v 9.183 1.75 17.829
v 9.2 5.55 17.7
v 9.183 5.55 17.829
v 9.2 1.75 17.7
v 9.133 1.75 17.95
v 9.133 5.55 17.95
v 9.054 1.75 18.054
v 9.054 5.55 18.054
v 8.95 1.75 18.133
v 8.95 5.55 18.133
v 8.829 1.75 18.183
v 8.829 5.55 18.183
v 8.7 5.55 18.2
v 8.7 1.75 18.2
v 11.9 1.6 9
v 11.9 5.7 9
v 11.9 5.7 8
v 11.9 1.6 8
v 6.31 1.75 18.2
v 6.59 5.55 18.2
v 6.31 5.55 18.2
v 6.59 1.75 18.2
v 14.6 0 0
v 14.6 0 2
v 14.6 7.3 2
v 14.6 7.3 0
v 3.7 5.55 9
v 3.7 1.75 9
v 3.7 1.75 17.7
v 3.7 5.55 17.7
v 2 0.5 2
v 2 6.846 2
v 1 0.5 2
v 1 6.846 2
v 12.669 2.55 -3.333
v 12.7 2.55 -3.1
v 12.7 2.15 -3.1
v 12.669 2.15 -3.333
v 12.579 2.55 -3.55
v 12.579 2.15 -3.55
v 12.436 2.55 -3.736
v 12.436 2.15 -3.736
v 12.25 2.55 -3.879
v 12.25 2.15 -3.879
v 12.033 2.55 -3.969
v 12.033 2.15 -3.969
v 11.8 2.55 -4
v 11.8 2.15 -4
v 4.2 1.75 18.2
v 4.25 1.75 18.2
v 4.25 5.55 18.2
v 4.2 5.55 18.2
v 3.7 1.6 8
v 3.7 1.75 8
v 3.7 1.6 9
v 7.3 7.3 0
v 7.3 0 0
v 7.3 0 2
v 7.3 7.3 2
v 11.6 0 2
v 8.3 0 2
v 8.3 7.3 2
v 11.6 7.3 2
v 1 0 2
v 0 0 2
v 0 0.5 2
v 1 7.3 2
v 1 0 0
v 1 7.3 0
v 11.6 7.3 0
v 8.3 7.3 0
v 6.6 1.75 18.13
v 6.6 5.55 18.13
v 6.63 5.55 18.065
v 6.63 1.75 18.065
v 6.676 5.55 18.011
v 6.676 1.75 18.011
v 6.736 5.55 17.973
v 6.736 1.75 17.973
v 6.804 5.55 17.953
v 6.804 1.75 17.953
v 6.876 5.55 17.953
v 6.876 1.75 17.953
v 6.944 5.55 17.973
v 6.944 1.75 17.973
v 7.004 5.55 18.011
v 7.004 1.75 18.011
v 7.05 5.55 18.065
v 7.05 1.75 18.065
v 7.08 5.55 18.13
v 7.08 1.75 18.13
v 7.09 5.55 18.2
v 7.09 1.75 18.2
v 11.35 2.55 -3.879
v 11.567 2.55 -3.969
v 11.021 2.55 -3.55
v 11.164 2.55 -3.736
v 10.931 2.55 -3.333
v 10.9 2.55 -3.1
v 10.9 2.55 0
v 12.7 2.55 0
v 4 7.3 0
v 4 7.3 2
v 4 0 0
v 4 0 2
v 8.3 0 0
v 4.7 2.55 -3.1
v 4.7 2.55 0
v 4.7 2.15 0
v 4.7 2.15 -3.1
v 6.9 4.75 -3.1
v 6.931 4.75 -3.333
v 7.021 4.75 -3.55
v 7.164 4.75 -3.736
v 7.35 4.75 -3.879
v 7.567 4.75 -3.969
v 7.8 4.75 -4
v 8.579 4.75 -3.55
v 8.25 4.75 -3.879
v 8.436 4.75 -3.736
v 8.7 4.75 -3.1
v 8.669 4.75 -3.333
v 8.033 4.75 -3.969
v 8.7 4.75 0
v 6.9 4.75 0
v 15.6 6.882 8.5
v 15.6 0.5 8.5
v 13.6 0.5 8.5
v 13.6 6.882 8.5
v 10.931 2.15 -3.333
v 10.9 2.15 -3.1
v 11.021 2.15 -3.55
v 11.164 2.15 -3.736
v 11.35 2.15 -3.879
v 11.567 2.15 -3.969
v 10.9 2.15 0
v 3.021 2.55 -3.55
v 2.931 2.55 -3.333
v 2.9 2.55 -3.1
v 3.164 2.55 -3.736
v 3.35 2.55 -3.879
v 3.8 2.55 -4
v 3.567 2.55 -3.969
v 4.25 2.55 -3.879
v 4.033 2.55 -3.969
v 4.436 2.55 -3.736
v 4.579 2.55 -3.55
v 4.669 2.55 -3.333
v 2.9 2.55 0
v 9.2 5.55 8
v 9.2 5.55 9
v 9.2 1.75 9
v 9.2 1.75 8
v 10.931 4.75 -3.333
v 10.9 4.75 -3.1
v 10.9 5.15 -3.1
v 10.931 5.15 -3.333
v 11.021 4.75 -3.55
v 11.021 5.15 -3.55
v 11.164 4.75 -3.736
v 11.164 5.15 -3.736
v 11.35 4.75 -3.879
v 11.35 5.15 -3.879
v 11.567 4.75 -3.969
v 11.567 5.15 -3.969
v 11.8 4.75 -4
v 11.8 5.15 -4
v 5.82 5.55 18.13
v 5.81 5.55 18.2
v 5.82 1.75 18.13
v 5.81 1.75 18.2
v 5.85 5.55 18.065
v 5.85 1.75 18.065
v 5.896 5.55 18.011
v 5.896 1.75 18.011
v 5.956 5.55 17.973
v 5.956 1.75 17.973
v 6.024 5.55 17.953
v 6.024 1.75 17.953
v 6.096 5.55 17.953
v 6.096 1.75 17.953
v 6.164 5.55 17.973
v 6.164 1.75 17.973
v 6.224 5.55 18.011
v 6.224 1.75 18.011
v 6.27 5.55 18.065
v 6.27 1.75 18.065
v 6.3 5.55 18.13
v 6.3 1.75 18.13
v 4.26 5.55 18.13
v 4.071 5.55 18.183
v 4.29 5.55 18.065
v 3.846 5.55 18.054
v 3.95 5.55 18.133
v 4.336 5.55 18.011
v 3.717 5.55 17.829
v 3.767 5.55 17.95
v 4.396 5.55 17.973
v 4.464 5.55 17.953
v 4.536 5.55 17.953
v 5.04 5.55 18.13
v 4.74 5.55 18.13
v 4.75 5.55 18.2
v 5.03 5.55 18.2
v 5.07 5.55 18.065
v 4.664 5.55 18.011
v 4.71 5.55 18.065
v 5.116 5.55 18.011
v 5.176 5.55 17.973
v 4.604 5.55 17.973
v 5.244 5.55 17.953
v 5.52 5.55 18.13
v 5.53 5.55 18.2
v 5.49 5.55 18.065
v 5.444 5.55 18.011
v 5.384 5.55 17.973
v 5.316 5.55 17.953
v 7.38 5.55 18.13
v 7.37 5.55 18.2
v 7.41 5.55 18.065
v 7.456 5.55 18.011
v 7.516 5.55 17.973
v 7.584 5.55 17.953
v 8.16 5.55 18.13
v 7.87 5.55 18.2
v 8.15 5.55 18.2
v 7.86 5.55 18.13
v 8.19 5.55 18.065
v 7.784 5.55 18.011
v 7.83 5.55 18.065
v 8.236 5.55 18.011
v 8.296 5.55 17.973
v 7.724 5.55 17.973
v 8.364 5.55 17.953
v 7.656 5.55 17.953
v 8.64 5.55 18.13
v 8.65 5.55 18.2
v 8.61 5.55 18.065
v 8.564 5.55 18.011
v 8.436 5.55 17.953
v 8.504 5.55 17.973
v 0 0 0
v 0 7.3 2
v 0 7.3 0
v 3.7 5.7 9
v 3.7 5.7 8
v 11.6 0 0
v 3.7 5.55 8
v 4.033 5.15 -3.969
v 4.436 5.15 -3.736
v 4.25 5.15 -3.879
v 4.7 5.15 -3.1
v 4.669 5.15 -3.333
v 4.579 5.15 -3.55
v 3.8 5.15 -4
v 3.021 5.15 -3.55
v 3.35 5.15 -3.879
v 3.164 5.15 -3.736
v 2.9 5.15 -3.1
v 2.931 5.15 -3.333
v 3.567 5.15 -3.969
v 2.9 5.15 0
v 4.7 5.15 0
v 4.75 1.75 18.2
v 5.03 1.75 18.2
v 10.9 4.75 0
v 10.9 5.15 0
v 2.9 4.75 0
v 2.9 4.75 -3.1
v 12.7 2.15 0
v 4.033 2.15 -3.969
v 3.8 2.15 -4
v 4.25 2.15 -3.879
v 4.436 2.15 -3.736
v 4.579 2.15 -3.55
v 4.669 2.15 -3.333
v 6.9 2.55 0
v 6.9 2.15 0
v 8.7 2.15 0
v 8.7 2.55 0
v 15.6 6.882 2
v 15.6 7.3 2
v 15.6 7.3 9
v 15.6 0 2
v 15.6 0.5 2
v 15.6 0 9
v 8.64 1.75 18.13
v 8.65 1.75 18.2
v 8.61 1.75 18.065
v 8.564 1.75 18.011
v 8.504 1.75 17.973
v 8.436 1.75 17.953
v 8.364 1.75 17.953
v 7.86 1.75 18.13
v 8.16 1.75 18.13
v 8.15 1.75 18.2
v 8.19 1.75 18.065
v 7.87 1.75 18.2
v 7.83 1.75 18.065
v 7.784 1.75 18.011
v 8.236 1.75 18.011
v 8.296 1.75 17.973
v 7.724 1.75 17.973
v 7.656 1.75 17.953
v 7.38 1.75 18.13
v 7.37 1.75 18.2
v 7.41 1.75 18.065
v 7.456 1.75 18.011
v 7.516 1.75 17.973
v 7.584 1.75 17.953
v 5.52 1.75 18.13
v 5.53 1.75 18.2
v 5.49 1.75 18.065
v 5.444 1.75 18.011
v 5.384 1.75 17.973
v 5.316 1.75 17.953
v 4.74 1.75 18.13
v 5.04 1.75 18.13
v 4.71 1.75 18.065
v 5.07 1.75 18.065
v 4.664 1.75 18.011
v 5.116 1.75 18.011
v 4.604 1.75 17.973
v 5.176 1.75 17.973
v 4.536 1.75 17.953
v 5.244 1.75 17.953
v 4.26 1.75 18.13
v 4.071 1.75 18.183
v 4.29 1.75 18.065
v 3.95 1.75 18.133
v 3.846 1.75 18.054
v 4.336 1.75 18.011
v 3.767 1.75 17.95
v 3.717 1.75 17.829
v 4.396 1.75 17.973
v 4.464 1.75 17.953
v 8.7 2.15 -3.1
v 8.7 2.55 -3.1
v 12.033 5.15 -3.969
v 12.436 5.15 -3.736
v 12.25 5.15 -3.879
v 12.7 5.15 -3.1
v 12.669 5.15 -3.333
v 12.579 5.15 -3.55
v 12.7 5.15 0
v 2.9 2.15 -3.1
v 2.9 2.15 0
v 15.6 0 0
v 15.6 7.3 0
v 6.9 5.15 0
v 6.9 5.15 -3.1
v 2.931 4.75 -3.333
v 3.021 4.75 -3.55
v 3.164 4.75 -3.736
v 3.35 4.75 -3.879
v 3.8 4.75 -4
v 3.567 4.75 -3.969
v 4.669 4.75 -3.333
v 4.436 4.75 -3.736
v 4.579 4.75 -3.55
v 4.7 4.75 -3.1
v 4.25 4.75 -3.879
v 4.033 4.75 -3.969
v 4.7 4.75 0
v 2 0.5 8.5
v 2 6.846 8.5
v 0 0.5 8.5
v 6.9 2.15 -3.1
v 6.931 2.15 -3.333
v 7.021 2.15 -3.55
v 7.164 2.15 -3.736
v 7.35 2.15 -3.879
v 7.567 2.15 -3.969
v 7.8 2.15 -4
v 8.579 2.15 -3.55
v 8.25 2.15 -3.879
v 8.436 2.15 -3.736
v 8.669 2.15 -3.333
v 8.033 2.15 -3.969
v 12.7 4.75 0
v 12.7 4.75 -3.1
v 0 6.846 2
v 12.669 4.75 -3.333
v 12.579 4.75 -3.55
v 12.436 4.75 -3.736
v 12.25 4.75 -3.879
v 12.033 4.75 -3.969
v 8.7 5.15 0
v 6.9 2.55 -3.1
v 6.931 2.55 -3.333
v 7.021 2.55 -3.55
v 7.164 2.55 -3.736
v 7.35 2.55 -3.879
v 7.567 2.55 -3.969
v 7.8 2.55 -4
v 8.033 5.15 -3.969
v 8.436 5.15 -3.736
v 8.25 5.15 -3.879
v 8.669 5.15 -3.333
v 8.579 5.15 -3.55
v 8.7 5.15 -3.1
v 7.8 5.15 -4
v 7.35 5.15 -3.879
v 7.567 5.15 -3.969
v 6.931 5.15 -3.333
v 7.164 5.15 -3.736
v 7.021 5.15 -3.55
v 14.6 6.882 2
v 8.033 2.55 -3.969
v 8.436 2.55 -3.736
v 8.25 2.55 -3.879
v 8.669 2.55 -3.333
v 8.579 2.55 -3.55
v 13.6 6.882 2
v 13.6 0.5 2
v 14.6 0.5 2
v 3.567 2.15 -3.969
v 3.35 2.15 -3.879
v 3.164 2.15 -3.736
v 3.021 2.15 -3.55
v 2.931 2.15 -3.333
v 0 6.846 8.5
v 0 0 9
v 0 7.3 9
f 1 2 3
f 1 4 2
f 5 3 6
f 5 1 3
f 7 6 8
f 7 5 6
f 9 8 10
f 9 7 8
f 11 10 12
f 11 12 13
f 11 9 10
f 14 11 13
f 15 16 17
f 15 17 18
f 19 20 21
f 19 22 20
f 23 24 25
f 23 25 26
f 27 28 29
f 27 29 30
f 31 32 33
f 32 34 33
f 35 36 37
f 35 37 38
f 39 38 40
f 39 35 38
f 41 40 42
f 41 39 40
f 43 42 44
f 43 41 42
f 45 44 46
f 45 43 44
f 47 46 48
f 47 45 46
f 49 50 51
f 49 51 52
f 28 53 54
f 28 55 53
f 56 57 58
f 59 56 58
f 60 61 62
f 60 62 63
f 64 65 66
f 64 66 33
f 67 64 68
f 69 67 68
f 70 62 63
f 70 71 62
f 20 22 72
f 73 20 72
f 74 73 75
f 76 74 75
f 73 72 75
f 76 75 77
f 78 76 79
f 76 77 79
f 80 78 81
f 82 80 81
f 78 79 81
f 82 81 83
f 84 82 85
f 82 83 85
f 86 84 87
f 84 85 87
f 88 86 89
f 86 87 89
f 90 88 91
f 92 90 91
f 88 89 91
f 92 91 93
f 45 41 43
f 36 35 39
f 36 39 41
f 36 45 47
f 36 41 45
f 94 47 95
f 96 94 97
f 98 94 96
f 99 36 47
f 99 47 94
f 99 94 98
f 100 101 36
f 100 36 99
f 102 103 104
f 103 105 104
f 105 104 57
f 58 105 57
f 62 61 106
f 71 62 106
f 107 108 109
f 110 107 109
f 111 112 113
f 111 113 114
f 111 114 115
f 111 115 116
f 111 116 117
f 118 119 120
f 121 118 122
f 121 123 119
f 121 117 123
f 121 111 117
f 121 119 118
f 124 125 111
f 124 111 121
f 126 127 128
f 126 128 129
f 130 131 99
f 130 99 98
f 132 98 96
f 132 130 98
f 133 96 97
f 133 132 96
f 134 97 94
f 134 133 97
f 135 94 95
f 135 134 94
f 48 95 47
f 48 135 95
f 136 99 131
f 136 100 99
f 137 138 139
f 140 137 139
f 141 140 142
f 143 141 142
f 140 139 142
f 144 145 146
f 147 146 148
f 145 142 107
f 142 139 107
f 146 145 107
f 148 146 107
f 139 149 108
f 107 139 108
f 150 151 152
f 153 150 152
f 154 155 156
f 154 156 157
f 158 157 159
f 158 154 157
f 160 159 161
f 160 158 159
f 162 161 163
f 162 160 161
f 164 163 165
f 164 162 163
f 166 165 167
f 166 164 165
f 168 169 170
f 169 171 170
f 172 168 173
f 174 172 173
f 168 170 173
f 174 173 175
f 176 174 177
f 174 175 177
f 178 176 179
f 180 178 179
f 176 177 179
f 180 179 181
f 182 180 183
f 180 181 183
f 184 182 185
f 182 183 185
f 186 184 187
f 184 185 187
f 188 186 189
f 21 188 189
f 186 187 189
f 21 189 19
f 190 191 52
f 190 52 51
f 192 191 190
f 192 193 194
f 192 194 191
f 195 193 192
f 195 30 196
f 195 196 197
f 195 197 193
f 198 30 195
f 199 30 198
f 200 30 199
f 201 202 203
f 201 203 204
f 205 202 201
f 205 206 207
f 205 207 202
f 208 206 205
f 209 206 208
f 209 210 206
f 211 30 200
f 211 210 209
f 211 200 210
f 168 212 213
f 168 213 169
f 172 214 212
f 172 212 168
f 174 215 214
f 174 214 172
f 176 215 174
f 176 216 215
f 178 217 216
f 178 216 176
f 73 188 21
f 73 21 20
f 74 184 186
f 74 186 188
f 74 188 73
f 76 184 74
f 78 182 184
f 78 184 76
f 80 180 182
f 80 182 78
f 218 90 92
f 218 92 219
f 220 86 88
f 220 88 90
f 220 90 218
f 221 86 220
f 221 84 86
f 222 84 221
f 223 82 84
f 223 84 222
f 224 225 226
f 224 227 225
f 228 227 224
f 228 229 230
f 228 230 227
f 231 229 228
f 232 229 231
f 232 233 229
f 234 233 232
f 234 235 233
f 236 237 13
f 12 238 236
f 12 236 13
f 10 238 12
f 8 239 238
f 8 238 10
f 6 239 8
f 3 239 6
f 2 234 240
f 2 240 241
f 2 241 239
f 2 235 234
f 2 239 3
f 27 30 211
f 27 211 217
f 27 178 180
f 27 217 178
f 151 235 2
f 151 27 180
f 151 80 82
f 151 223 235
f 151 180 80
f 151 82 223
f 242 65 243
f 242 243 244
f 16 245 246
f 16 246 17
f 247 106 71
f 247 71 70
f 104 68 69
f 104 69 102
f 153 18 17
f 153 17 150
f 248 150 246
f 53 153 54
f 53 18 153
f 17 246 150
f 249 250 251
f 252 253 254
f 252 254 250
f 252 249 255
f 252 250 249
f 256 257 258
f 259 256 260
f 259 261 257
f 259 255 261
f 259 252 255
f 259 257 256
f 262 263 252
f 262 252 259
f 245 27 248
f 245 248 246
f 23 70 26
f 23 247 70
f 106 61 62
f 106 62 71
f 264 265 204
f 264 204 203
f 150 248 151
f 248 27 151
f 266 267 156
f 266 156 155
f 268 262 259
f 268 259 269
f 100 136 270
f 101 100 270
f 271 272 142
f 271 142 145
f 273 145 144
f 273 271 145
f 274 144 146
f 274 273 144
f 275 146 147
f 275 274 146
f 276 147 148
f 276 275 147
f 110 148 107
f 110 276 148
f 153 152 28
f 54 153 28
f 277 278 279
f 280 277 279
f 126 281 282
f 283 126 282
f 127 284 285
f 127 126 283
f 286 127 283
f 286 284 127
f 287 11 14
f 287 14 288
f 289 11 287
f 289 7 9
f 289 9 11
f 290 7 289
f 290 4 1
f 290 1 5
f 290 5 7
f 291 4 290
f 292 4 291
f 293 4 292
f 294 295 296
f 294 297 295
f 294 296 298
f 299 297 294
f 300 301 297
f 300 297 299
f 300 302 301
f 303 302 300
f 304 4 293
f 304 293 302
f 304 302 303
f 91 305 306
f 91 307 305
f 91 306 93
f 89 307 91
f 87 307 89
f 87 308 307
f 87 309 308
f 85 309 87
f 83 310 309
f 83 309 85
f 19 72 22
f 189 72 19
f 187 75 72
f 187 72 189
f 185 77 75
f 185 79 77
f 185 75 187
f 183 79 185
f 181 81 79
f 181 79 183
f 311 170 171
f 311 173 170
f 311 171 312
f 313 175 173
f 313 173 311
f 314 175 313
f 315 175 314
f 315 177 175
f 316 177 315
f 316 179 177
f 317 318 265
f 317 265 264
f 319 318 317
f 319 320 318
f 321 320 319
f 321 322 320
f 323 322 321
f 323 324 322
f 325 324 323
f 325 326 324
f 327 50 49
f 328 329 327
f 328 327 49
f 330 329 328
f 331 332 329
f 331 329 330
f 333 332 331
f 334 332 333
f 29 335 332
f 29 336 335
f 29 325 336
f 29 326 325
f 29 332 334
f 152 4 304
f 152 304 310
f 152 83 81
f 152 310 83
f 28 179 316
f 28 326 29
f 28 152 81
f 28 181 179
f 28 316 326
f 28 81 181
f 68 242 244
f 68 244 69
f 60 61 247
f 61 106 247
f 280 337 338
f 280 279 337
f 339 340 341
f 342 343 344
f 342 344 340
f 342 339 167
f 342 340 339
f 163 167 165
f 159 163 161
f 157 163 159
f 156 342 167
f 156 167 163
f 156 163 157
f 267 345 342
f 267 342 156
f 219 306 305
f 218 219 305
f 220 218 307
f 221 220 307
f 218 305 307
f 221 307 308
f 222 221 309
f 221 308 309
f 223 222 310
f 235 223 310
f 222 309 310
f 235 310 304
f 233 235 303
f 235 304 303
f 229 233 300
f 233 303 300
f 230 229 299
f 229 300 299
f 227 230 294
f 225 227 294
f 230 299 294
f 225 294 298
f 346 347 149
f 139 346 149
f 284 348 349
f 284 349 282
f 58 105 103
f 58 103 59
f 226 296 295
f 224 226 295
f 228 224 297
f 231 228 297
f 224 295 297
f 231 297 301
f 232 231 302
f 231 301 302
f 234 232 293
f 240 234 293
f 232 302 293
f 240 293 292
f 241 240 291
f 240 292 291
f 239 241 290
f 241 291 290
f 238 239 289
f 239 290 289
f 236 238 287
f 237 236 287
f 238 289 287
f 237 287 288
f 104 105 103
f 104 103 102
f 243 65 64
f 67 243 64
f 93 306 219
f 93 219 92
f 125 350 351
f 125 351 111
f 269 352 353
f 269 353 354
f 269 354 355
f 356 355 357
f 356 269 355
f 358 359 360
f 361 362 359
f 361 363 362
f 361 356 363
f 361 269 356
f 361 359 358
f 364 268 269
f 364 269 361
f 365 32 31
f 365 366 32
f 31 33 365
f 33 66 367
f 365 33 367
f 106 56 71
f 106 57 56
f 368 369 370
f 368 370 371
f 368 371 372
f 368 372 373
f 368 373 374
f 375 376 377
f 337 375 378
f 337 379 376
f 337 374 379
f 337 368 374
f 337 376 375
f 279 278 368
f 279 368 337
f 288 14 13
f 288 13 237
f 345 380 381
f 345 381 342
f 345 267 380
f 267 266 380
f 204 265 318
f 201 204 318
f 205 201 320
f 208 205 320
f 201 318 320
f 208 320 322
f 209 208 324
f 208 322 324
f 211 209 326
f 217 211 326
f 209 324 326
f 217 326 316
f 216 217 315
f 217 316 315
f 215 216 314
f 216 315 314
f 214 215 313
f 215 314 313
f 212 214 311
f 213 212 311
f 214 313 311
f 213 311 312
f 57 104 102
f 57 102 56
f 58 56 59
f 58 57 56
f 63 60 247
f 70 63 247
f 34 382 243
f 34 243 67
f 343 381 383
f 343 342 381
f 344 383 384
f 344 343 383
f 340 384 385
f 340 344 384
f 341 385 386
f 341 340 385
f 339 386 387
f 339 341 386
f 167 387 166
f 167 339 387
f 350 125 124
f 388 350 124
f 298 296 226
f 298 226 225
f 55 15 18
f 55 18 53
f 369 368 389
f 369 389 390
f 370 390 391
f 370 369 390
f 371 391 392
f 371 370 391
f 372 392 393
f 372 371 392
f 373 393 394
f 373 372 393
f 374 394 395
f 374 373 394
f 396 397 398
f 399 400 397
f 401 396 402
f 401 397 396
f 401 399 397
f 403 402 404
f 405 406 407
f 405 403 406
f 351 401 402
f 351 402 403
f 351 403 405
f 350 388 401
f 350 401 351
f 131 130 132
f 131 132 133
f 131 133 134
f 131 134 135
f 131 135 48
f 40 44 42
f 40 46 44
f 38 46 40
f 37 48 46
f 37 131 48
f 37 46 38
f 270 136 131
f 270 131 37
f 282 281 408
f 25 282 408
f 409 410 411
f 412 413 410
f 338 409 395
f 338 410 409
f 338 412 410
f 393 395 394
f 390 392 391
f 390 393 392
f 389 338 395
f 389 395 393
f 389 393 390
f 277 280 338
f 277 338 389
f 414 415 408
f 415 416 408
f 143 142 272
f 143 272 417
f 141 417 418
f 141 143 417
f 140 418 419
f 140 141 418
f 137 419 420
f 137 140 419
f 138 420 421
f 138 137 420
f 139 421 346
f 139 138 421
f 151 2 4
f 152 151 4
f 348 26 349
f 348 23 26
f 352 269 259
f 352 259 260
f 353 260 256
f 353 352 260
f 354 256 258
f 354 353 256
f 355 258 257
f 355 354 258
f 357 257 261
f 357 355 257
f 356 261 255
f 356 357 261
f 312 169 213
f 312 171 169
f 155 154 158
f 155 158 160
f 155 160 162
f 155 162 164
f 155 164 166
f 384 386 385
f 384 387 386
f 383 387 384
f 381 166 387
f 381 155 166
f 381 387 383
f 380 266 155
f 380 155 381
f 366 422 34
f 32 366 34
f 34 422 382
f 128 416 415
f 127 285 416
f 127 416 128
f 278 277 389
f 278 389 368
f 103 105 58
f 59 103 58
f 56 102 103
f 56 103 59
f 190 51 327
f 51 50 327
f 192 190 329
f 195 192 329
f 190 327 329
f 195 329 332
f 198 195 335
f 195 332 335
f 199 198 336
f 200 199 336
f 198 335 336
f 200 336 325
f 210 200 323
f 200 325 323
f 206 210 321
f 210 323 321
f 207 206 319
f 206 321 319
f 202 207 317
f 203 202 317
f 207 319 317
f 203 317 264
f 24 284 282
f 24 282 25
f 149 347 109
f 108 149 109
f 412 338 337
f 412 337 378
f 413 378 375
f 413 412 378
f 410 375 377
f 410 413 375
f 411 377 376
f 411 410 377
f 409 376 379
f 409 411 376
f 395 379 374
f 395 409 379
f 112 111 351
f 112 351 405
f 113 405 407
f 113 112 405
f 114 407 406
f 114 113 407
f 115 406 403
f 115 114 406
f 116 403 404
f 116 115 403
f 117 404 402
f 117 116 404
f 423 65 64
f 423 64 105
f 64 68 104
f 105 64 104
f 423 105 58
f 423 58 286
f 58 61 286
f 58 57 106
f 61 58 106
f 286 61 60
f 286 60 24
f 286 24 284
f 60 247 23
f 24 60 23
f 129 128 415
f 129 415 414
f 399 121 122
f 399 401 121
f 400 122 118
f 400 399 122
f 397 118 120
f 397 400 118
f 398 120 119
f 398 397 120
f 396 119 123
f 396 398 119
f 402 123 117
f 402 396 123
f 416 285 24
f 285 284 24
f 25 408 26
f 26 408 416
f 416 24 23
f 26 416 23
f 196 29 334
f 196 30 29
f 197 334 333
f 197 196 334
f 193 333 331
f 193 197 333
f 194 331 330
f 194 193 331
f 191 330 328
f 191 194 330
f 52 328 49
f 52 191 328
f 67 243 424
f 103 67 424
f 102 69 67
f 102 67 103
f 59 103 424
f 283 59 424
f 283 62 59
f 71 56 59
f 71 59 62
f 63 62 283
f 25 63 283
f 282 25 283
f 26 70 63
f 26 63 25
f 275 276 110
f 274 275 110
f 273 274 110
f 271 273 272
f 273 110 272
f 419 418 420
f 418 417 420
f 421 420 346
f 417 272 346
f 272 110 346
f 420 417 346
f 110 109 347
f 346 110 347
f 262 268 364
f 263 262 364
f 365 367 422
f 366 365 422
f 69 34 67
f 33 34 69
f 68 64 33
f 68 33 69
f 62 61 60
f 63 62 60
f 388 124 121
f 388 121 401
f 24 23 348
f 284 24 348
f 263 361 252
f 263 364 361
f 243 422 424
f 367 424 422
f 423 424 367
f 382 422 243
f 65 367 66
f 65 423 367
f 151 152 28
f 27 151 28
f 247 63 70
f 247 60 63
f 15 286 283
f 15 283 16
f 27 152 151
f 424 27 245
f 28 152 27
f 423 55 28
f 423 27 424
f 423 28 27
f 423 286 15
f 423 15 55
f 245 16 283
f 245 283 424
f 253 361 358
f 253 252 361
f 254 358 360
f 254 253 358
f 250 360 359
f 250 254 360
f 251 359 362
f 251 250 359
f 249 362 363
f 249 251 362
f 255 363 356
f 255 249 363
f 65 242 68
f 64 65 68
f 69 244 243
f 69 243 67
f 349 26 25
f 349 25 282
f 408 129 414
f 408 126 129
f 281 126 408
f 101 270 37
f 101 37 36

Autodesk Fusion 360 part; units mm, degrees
sketch "Sketch1" plane through (0, 0, 0) normal (0, 1, 0) x (1, 0, 0)
  line L0 (0, 0) -> (15.6, 0)
  line L1 (15.6, 0) -> (15.6, -2)
  line L2 (0, -2) -> (0, 0)
  line L3 (15.6, -2) -> (15.6, -9)
  line L4 (15.6, -9) -> (0, -9)
  line L5 (0, -9) -> (0, -2)
  line L6 (0, -2) -> (1, -2)
  line L7 (1, -2) -> (1, 0)
  line L8 (1, 0) -> (0, 0)
  line L9 (0, 0) -> (0, -2)
  line L10 (15.6, -2) -> (14.6, -2)
  line L11 (14.6, -2) -> (14.6, 0)
  line L12 (14.6, 0) -> (15.6, 0)
  line L13 (15.6, 0) -> (15.6, -2)
  line L14 (11.6, -2) -> (11.6, 0)
  line L15 (11.6, 0) -> (14.6, 0)
  line L16 (14.6, 0) -> (14.6, -2)
  line L17 (4, -2) -> (4, 0)
  line L18 (4, 0) -> (1, 0)
  line L19 (1, 0) -> (1, -2)
  line L20 (7.8, -14) -> (7.8, 4) construction
  line L21 (1, -2) -> (0, -2)
  line L22 (0, -2) -> (1, -2)
  line L23 (15.6, -2) -> (14.6, -2)
  line L24 (14.6, -2) -> (15.6, -2)
  line L25 (8.3, -2) -> (8.3, 0)
  line L26 (8.3, 0) -> (7.3, 0)
  line L27 (7.3, 0) -> (7.3, -2)
  line L28 (4, -2) -> (7.3, -2)
  line L29 (8.3, -2) -> (11.6, -2)
  line L30 (11.6, -2) -> (8.3, -2)
  line L31 (7.3, -2) -> (4, -2)
  dimension "d2" = 2
  dimension "d3" = 15.6
  dimension "d4" = 7
  dimension "d5" = 1
  dimension "d6" = 1
  dimension "d7" = 2
  dimension "d8" = 3
  dimension "d9" = 2
  dimension "d10" = 3
  dimension "d11" = 2
  dimension "d12" = 7.8
  dimension "d13" = 1
  dimension "d14" = 2
extrude "Extrude1" add sketch "Sketch1" along normal blind 7.3 contours L0 L3 L4 L5 L6 L7 L10 L11 L14 L15 L16 L17 L18 L19 L21 L22 L23 L24 L25 L26 L27 L28 L29 L30 L31 makes body 1
extrude "Extrude2" add sketch "Sketch1" along normal blind 7.3 separate body contours L0 L2 L6 L7 L8 L9 L19 L21 L22 | L0 L17 L27 L28 L31 | L0 L14 L25 L29 L30 | L0 L1 L10 L11 L12 L13 L16 L23 L24 makes body 2 at (5.1, 2.4333, 0) makes body 3 at (9.4, 2.4333, 0) makes body 4 at (1, 2.4333, 1.3333) makes body 5 at (14.6, 2.4333, 1.3333)
sketch "Sketch2" plane through (0, 0, 9) normal (0, 0, 1) x (-1, 0, 0)
  line L0 (0, 0) -> (-15.6, 0)
  line L1 (-15.6, 0) -> (-15.6, -7.3)
  line L2 (-15.6, -7.3) -> (0, -7.3)
  line L3 (0, -7.3) -> (0, 0)
  line L4 (0, 0) -> (-15.6, -7.3) construction
  line L5 (-15.6, 0) -> (0, -7.3) construction
  line L6 (-11.9, -1.6) -> (-3.7, -1.6)
  line L7 (-3.7, -1.6) -> (-3.7, -5.7)
  line L8 (-3.7, -5.7) -> (-11.9, -5.7)
  line L9 (-11.9, -5.7) -> (-11.9, -1.6)
  line L10 (-11.9, -1.6) -> (-3.7, -5.7) construction
  line L11 (-3.7, -1.6) -> (-11.9, -5.7) construction
  line L12 (-3.7, -5.55) -> (-9.2, -5.55)
  line L13 (-9.2, -5.55) -> (-9.2, -1.75)
  line L14 (-9.2, -1.75) -> (-3.7, -1.75)
  line L15 (-3.7, -1.75) -> (-3.7, -5.55)
  line L16 (1.4148, -3.65) -> (-17, -3.65) construction
  line L17 (1.4148, -1.75) -> (-17, -1.75) construction
  line L18 (-3.7, -1.75) -> (-3.77, -1.75) construction
  point P0 (-7.8, -3.65)
  dimension "d19" = 8.2
  dimension "d20" = 4.1
  dimension "d21" = 5.5
  dimension "d22" = 3.8
  dimension "d23" = 1.9
extrude "Extrude3" add sketch "Sketch2" along normal blind 9.2 separate body contours L7 L12 L13 L14 L15 makes body 6
extrude "Extrude4" cut sketch "Sketch2" against normal blind 1 contours L6 L7 L8 L9 L12 L13 L14 bodies 1
fillet "Fillet1" radius 0.5 2 edges at (9.2, 3.65, 18.2) (3.7, 3.65, 18.2) on bodies 6
sketch "Sketch3" plane through (0, 1.75, 0) normal (0, -1, 0) x (1, 0, 0)
  arc A0 (4.2, 18.2) -> (3.7, 17.7) centre (4.2, 17.7) ccw
  line L0 (3.7, 17.7) -> (3.7, 9)
  line L1 (3.7, 9) -> (9.2, 9)
  line L2 (9.2, 9) -> (9.2, 17.7)
  arc A1 (9.2, 17.7) -> (8.7, 18.2) centre (8.7, 17.7) ccw
  line L3 (8.7, 18.2) -> (4.2, 18.2)
  circle A2 centre (4.5, 18.2) radius 0.25
  circle A3 centre (5.28, 18.2) radius 0.25
  circle A4 centre (6.06, 18.2) radius 0.25
  circle A5 centre (6.84, 18.2) radius 0.25
  circle A6 centre (7.62, 18.2) radius 0.25
  circle A7 centre (8.4, 18.2) radius 0.25
  dimension "d30" = 0.5
  dimension "d43" = 3.9
  dimension "d44" = 0
extrude "Extrude6" cut sketch "Sketch3" against normal blind 5 contours L3 A2 | L3 A3 | L3 A4 | L3 A7 | L3 A5 | L3 A6 picked at (4.5053, 18.1045) picked at (5.2853, 18.1045) picked at (6.0653, 18.1045) picked at (8.4053, 18.1045) picked at (6.8453, 18.1045) picked at (7.6253, 18.1045) bodies 6
sketch "Sketch4" plane through (15.6, 0, 0) normal (1, 0, 0) x (0, 1, 0)
  line L0 (0, 9) -> (0, 2)
  line L1 (0, 2) -> (7.3, 2)
  line L2 (7.3, 2) -> (7.3, 9)
  line L3 (7.3, 9) -> (0, 9)
  line L4 (0.5, 8.5) -> (6.8816, 8.5)
  line L5 (6.8816, 8.5) -> (6.8816, 2)
  line L6 (6.8816, 2) -> (0.5, 2)
  line L7 (0.5, 2) -> (0.5, 8.5)
  dimension "d47" = 6.5
extrude "Extrude7" cut sketch "Sketch4" against normal blind 2 contours L1 L4 L5 L6 L7 bodies 1
sketch "Sketch5" plane through (0, 0, 0) normal (-1, 0, 0) x (0, -1, 0)
  line L0 (0, 2) -> (0, 9)
  line L1 (0, 9) -> (-7.3, 9)
  line L2 (-7.3, 9) -> (-7.3, 2)
  line L3 (-7.3, 2) -> (0, 2)
  line L4 (-0.5, 8.5) -> (-6.8462, 8.5)
  line L5 (-6.8462, 8.5) -> (-6.8462, 2)
  line L6 (-6.8462, 2) -> (-0.5, 2)
  line L7 (-0.5, 2) -> (-0.5, 8.5)
  dimension "d50" = 6.5
extrude "Extrude8" cut sketch "Sketch5" against normal blind 2 contours L3 L4 L5 L6 L7 bodies 1
sketch "Sketch6" plane through (0, 0, 0) normal (0, 0, -1) x (1, 0, 0)
  line L0 (7.3, 0) -> (4, 0)
  line L1 (4, 0) -> (4, -7.3)
  line L2 (4, -7.3) -> (7.3, -7.3)
  line L3 (7.3, -7.3) -> (7.3, 0)
  line L4 (11.8, -2.35) -> (3.8, -2.35) construction
  line L5 (3.8, -2.35) -> (3.8, -4.95) construction
  line L6 (3.8, -4.95) -> (11.8, -4.95) construction
  line L7 (11.8, -4.95) -> (11.8, -2.35) construction
  line L8 (11.8, -2.35) -> (3.8, -4.95) construction
  line L9 (3.8, -2.35) -> (11.8, -4.95) construction
  line L10 (7.8, 2) -> (7.8, -8.6458) construction
  line L11 (4.7, -2.15) -> (2.9, -2.15)
  line L12 (2.9, -2.15) -> (2.9, -2.55)
  line L13 (2.9, -2.55) -> (4.7, -2.55)
  line L14 (4.7, -2.55) -> (4.7, -2.15)
  line L15 (4.7, -2.15) -> (2.9, -2.55) construction
  line L16 (2.9, -2.15) -> (4.7, -2.55) construction
  line L17 (4.7, -5.15) -> (2.9, -5.15)
  line L18 (2.9, -5.15) -> (2.9, -4.75)
  line L19 (2.9, -4.75) -> (4.7, -4.75)
  line L20 (4.7, -4.75) -> (4.7, -5.15)
  line L21 (4.7, -5.15) -> (2.9, -4.75) construction
  line L22 (2.9, -5.15) -> (4.7, -4.75) construction
  line L23 (8.7, -2.55) -> (6.9, -2.55)
  line L24 (6.9, -2.55) -> (6.9, -2.15)
  line L25 (6.9, -2.15) -> (8.7, -2.15)
  line L26 (8.7, -2.15) -> (8.7, -2.55)
  line L27 (8.7, -2.55) -> (6.9, -2.15) construction
  line L28 (6.9, -2.55) -> (8.7, -2.15) construction
  line L29 (8.7, -5.15) -> (6.9, -5.15)
  line L30 (6.9, -5.15) -> (6.9, -4.75)
  line L31 (6.9, -4.75) -> (8.7, -4.75)
  line L32 (8.7, -4.75) -> (8.7, -5.15)
  line L33 (8.7, -5.15) -> (6.9, -4.75) construction
  line L34 (6.9, -5.15) -> (8.7, -4.75) construction
  line L35 (12.7, -2.55) -> (10.9, -2.55)
  line L36 (10.9, -2.55) -> (10.9, -2.15)
  line L37 (10.9, -2.15) -> (12.7, -2.15)
  line L38 (12.7, -2.15) -> (12.7, -2.55)
  line L39 (12.7, -2.55) -> (10.9, -2.15) construction
  line L40 (10.9, -2.55) -> (12.7, -2.15) construction
  line L41 (12.7, -5.15) -> (10.9, -5.15)
  line L42 (10.9, -5.15) -> (10.9, -4.75)
  line L43 (10.9, -4.75) -> (12.7, -4.75)
  line L44 (12.7, -4.75) -> (12.7, -5.15)
  line L45 (12.7, -5.15) -> (10.9, -4.75) construction
  line L46 (10.9, -5.15) -> (12.7, -4.75) construction
  point P0 (7.8, -3.65)
  point P1 (3.8, -2.35)
  point P2 (3.8, -4.95)
  point P3 (7.8, -2.35)
  point P4 (7.8, -4.95)
  point P5 (11.8, -2.35)
  point P6 (11.8, -4.95)
  dimension "d53" = 8
  dimension "d54" = 2.6
  dimension "d55" = 1.8
  dimension "d56" = 0.4
  dimension "d57" = 1.8
  dimension "d58" = 0.4
  dimension "d59" = 1.8
  dimension "d60" = 0.4
  dimension "d61" = 1.8
  dimension "d62" = 0.4
  dimension "d63" = 1.8
  dimension "d64" = 0.4
  dimension "d65" = 1.8
  dimension "d66" = 0.4
extrude "Extrude9" add sketch "Sketch6" along normal blind 4 separate body contours L3 L23 L25 L26 | L3 L23 L24 L25 | L1 L11 L13 L14 | L1 L11 L12 L13 | L3 L29 L31 L32 | L3 L29 L30 L31 | L1 L17 L19 L20 | L1 L17 L18 L19 | L35 L36 L37 L38 | L41 L42 L43 L44 makes body 7 at (7.5, 4.75, -1.3333) makes body 8 at (4.1, 2.15, -1.3333) makes body 9 at (12.1, 2.55, -1.3333) makes body 10 at (7.5, 2.15, -1.3333) makes body 11 at (3.5, 4.75, -1.3333) makes body 12 at (12.1, 5.15, -1.3333)
fillet "Fillet2" radius 0.9 12 edges at (6.9, 4.95, -4) (8.7, 4.95, -4) (2.9, 2.35, -4) (4.7, 2.35, -4) (10.9, 2.35, -4) (12.7, 2.35, -4) (6.9, 2.35, -4) (8.7, 2.35, -4) (2.9, 4.95, -4) (4.7, 4.95, -4) (10.9, 4.95, -4) (12.7, 4.95, -4) on bodies 7 8 9 10 11 12
